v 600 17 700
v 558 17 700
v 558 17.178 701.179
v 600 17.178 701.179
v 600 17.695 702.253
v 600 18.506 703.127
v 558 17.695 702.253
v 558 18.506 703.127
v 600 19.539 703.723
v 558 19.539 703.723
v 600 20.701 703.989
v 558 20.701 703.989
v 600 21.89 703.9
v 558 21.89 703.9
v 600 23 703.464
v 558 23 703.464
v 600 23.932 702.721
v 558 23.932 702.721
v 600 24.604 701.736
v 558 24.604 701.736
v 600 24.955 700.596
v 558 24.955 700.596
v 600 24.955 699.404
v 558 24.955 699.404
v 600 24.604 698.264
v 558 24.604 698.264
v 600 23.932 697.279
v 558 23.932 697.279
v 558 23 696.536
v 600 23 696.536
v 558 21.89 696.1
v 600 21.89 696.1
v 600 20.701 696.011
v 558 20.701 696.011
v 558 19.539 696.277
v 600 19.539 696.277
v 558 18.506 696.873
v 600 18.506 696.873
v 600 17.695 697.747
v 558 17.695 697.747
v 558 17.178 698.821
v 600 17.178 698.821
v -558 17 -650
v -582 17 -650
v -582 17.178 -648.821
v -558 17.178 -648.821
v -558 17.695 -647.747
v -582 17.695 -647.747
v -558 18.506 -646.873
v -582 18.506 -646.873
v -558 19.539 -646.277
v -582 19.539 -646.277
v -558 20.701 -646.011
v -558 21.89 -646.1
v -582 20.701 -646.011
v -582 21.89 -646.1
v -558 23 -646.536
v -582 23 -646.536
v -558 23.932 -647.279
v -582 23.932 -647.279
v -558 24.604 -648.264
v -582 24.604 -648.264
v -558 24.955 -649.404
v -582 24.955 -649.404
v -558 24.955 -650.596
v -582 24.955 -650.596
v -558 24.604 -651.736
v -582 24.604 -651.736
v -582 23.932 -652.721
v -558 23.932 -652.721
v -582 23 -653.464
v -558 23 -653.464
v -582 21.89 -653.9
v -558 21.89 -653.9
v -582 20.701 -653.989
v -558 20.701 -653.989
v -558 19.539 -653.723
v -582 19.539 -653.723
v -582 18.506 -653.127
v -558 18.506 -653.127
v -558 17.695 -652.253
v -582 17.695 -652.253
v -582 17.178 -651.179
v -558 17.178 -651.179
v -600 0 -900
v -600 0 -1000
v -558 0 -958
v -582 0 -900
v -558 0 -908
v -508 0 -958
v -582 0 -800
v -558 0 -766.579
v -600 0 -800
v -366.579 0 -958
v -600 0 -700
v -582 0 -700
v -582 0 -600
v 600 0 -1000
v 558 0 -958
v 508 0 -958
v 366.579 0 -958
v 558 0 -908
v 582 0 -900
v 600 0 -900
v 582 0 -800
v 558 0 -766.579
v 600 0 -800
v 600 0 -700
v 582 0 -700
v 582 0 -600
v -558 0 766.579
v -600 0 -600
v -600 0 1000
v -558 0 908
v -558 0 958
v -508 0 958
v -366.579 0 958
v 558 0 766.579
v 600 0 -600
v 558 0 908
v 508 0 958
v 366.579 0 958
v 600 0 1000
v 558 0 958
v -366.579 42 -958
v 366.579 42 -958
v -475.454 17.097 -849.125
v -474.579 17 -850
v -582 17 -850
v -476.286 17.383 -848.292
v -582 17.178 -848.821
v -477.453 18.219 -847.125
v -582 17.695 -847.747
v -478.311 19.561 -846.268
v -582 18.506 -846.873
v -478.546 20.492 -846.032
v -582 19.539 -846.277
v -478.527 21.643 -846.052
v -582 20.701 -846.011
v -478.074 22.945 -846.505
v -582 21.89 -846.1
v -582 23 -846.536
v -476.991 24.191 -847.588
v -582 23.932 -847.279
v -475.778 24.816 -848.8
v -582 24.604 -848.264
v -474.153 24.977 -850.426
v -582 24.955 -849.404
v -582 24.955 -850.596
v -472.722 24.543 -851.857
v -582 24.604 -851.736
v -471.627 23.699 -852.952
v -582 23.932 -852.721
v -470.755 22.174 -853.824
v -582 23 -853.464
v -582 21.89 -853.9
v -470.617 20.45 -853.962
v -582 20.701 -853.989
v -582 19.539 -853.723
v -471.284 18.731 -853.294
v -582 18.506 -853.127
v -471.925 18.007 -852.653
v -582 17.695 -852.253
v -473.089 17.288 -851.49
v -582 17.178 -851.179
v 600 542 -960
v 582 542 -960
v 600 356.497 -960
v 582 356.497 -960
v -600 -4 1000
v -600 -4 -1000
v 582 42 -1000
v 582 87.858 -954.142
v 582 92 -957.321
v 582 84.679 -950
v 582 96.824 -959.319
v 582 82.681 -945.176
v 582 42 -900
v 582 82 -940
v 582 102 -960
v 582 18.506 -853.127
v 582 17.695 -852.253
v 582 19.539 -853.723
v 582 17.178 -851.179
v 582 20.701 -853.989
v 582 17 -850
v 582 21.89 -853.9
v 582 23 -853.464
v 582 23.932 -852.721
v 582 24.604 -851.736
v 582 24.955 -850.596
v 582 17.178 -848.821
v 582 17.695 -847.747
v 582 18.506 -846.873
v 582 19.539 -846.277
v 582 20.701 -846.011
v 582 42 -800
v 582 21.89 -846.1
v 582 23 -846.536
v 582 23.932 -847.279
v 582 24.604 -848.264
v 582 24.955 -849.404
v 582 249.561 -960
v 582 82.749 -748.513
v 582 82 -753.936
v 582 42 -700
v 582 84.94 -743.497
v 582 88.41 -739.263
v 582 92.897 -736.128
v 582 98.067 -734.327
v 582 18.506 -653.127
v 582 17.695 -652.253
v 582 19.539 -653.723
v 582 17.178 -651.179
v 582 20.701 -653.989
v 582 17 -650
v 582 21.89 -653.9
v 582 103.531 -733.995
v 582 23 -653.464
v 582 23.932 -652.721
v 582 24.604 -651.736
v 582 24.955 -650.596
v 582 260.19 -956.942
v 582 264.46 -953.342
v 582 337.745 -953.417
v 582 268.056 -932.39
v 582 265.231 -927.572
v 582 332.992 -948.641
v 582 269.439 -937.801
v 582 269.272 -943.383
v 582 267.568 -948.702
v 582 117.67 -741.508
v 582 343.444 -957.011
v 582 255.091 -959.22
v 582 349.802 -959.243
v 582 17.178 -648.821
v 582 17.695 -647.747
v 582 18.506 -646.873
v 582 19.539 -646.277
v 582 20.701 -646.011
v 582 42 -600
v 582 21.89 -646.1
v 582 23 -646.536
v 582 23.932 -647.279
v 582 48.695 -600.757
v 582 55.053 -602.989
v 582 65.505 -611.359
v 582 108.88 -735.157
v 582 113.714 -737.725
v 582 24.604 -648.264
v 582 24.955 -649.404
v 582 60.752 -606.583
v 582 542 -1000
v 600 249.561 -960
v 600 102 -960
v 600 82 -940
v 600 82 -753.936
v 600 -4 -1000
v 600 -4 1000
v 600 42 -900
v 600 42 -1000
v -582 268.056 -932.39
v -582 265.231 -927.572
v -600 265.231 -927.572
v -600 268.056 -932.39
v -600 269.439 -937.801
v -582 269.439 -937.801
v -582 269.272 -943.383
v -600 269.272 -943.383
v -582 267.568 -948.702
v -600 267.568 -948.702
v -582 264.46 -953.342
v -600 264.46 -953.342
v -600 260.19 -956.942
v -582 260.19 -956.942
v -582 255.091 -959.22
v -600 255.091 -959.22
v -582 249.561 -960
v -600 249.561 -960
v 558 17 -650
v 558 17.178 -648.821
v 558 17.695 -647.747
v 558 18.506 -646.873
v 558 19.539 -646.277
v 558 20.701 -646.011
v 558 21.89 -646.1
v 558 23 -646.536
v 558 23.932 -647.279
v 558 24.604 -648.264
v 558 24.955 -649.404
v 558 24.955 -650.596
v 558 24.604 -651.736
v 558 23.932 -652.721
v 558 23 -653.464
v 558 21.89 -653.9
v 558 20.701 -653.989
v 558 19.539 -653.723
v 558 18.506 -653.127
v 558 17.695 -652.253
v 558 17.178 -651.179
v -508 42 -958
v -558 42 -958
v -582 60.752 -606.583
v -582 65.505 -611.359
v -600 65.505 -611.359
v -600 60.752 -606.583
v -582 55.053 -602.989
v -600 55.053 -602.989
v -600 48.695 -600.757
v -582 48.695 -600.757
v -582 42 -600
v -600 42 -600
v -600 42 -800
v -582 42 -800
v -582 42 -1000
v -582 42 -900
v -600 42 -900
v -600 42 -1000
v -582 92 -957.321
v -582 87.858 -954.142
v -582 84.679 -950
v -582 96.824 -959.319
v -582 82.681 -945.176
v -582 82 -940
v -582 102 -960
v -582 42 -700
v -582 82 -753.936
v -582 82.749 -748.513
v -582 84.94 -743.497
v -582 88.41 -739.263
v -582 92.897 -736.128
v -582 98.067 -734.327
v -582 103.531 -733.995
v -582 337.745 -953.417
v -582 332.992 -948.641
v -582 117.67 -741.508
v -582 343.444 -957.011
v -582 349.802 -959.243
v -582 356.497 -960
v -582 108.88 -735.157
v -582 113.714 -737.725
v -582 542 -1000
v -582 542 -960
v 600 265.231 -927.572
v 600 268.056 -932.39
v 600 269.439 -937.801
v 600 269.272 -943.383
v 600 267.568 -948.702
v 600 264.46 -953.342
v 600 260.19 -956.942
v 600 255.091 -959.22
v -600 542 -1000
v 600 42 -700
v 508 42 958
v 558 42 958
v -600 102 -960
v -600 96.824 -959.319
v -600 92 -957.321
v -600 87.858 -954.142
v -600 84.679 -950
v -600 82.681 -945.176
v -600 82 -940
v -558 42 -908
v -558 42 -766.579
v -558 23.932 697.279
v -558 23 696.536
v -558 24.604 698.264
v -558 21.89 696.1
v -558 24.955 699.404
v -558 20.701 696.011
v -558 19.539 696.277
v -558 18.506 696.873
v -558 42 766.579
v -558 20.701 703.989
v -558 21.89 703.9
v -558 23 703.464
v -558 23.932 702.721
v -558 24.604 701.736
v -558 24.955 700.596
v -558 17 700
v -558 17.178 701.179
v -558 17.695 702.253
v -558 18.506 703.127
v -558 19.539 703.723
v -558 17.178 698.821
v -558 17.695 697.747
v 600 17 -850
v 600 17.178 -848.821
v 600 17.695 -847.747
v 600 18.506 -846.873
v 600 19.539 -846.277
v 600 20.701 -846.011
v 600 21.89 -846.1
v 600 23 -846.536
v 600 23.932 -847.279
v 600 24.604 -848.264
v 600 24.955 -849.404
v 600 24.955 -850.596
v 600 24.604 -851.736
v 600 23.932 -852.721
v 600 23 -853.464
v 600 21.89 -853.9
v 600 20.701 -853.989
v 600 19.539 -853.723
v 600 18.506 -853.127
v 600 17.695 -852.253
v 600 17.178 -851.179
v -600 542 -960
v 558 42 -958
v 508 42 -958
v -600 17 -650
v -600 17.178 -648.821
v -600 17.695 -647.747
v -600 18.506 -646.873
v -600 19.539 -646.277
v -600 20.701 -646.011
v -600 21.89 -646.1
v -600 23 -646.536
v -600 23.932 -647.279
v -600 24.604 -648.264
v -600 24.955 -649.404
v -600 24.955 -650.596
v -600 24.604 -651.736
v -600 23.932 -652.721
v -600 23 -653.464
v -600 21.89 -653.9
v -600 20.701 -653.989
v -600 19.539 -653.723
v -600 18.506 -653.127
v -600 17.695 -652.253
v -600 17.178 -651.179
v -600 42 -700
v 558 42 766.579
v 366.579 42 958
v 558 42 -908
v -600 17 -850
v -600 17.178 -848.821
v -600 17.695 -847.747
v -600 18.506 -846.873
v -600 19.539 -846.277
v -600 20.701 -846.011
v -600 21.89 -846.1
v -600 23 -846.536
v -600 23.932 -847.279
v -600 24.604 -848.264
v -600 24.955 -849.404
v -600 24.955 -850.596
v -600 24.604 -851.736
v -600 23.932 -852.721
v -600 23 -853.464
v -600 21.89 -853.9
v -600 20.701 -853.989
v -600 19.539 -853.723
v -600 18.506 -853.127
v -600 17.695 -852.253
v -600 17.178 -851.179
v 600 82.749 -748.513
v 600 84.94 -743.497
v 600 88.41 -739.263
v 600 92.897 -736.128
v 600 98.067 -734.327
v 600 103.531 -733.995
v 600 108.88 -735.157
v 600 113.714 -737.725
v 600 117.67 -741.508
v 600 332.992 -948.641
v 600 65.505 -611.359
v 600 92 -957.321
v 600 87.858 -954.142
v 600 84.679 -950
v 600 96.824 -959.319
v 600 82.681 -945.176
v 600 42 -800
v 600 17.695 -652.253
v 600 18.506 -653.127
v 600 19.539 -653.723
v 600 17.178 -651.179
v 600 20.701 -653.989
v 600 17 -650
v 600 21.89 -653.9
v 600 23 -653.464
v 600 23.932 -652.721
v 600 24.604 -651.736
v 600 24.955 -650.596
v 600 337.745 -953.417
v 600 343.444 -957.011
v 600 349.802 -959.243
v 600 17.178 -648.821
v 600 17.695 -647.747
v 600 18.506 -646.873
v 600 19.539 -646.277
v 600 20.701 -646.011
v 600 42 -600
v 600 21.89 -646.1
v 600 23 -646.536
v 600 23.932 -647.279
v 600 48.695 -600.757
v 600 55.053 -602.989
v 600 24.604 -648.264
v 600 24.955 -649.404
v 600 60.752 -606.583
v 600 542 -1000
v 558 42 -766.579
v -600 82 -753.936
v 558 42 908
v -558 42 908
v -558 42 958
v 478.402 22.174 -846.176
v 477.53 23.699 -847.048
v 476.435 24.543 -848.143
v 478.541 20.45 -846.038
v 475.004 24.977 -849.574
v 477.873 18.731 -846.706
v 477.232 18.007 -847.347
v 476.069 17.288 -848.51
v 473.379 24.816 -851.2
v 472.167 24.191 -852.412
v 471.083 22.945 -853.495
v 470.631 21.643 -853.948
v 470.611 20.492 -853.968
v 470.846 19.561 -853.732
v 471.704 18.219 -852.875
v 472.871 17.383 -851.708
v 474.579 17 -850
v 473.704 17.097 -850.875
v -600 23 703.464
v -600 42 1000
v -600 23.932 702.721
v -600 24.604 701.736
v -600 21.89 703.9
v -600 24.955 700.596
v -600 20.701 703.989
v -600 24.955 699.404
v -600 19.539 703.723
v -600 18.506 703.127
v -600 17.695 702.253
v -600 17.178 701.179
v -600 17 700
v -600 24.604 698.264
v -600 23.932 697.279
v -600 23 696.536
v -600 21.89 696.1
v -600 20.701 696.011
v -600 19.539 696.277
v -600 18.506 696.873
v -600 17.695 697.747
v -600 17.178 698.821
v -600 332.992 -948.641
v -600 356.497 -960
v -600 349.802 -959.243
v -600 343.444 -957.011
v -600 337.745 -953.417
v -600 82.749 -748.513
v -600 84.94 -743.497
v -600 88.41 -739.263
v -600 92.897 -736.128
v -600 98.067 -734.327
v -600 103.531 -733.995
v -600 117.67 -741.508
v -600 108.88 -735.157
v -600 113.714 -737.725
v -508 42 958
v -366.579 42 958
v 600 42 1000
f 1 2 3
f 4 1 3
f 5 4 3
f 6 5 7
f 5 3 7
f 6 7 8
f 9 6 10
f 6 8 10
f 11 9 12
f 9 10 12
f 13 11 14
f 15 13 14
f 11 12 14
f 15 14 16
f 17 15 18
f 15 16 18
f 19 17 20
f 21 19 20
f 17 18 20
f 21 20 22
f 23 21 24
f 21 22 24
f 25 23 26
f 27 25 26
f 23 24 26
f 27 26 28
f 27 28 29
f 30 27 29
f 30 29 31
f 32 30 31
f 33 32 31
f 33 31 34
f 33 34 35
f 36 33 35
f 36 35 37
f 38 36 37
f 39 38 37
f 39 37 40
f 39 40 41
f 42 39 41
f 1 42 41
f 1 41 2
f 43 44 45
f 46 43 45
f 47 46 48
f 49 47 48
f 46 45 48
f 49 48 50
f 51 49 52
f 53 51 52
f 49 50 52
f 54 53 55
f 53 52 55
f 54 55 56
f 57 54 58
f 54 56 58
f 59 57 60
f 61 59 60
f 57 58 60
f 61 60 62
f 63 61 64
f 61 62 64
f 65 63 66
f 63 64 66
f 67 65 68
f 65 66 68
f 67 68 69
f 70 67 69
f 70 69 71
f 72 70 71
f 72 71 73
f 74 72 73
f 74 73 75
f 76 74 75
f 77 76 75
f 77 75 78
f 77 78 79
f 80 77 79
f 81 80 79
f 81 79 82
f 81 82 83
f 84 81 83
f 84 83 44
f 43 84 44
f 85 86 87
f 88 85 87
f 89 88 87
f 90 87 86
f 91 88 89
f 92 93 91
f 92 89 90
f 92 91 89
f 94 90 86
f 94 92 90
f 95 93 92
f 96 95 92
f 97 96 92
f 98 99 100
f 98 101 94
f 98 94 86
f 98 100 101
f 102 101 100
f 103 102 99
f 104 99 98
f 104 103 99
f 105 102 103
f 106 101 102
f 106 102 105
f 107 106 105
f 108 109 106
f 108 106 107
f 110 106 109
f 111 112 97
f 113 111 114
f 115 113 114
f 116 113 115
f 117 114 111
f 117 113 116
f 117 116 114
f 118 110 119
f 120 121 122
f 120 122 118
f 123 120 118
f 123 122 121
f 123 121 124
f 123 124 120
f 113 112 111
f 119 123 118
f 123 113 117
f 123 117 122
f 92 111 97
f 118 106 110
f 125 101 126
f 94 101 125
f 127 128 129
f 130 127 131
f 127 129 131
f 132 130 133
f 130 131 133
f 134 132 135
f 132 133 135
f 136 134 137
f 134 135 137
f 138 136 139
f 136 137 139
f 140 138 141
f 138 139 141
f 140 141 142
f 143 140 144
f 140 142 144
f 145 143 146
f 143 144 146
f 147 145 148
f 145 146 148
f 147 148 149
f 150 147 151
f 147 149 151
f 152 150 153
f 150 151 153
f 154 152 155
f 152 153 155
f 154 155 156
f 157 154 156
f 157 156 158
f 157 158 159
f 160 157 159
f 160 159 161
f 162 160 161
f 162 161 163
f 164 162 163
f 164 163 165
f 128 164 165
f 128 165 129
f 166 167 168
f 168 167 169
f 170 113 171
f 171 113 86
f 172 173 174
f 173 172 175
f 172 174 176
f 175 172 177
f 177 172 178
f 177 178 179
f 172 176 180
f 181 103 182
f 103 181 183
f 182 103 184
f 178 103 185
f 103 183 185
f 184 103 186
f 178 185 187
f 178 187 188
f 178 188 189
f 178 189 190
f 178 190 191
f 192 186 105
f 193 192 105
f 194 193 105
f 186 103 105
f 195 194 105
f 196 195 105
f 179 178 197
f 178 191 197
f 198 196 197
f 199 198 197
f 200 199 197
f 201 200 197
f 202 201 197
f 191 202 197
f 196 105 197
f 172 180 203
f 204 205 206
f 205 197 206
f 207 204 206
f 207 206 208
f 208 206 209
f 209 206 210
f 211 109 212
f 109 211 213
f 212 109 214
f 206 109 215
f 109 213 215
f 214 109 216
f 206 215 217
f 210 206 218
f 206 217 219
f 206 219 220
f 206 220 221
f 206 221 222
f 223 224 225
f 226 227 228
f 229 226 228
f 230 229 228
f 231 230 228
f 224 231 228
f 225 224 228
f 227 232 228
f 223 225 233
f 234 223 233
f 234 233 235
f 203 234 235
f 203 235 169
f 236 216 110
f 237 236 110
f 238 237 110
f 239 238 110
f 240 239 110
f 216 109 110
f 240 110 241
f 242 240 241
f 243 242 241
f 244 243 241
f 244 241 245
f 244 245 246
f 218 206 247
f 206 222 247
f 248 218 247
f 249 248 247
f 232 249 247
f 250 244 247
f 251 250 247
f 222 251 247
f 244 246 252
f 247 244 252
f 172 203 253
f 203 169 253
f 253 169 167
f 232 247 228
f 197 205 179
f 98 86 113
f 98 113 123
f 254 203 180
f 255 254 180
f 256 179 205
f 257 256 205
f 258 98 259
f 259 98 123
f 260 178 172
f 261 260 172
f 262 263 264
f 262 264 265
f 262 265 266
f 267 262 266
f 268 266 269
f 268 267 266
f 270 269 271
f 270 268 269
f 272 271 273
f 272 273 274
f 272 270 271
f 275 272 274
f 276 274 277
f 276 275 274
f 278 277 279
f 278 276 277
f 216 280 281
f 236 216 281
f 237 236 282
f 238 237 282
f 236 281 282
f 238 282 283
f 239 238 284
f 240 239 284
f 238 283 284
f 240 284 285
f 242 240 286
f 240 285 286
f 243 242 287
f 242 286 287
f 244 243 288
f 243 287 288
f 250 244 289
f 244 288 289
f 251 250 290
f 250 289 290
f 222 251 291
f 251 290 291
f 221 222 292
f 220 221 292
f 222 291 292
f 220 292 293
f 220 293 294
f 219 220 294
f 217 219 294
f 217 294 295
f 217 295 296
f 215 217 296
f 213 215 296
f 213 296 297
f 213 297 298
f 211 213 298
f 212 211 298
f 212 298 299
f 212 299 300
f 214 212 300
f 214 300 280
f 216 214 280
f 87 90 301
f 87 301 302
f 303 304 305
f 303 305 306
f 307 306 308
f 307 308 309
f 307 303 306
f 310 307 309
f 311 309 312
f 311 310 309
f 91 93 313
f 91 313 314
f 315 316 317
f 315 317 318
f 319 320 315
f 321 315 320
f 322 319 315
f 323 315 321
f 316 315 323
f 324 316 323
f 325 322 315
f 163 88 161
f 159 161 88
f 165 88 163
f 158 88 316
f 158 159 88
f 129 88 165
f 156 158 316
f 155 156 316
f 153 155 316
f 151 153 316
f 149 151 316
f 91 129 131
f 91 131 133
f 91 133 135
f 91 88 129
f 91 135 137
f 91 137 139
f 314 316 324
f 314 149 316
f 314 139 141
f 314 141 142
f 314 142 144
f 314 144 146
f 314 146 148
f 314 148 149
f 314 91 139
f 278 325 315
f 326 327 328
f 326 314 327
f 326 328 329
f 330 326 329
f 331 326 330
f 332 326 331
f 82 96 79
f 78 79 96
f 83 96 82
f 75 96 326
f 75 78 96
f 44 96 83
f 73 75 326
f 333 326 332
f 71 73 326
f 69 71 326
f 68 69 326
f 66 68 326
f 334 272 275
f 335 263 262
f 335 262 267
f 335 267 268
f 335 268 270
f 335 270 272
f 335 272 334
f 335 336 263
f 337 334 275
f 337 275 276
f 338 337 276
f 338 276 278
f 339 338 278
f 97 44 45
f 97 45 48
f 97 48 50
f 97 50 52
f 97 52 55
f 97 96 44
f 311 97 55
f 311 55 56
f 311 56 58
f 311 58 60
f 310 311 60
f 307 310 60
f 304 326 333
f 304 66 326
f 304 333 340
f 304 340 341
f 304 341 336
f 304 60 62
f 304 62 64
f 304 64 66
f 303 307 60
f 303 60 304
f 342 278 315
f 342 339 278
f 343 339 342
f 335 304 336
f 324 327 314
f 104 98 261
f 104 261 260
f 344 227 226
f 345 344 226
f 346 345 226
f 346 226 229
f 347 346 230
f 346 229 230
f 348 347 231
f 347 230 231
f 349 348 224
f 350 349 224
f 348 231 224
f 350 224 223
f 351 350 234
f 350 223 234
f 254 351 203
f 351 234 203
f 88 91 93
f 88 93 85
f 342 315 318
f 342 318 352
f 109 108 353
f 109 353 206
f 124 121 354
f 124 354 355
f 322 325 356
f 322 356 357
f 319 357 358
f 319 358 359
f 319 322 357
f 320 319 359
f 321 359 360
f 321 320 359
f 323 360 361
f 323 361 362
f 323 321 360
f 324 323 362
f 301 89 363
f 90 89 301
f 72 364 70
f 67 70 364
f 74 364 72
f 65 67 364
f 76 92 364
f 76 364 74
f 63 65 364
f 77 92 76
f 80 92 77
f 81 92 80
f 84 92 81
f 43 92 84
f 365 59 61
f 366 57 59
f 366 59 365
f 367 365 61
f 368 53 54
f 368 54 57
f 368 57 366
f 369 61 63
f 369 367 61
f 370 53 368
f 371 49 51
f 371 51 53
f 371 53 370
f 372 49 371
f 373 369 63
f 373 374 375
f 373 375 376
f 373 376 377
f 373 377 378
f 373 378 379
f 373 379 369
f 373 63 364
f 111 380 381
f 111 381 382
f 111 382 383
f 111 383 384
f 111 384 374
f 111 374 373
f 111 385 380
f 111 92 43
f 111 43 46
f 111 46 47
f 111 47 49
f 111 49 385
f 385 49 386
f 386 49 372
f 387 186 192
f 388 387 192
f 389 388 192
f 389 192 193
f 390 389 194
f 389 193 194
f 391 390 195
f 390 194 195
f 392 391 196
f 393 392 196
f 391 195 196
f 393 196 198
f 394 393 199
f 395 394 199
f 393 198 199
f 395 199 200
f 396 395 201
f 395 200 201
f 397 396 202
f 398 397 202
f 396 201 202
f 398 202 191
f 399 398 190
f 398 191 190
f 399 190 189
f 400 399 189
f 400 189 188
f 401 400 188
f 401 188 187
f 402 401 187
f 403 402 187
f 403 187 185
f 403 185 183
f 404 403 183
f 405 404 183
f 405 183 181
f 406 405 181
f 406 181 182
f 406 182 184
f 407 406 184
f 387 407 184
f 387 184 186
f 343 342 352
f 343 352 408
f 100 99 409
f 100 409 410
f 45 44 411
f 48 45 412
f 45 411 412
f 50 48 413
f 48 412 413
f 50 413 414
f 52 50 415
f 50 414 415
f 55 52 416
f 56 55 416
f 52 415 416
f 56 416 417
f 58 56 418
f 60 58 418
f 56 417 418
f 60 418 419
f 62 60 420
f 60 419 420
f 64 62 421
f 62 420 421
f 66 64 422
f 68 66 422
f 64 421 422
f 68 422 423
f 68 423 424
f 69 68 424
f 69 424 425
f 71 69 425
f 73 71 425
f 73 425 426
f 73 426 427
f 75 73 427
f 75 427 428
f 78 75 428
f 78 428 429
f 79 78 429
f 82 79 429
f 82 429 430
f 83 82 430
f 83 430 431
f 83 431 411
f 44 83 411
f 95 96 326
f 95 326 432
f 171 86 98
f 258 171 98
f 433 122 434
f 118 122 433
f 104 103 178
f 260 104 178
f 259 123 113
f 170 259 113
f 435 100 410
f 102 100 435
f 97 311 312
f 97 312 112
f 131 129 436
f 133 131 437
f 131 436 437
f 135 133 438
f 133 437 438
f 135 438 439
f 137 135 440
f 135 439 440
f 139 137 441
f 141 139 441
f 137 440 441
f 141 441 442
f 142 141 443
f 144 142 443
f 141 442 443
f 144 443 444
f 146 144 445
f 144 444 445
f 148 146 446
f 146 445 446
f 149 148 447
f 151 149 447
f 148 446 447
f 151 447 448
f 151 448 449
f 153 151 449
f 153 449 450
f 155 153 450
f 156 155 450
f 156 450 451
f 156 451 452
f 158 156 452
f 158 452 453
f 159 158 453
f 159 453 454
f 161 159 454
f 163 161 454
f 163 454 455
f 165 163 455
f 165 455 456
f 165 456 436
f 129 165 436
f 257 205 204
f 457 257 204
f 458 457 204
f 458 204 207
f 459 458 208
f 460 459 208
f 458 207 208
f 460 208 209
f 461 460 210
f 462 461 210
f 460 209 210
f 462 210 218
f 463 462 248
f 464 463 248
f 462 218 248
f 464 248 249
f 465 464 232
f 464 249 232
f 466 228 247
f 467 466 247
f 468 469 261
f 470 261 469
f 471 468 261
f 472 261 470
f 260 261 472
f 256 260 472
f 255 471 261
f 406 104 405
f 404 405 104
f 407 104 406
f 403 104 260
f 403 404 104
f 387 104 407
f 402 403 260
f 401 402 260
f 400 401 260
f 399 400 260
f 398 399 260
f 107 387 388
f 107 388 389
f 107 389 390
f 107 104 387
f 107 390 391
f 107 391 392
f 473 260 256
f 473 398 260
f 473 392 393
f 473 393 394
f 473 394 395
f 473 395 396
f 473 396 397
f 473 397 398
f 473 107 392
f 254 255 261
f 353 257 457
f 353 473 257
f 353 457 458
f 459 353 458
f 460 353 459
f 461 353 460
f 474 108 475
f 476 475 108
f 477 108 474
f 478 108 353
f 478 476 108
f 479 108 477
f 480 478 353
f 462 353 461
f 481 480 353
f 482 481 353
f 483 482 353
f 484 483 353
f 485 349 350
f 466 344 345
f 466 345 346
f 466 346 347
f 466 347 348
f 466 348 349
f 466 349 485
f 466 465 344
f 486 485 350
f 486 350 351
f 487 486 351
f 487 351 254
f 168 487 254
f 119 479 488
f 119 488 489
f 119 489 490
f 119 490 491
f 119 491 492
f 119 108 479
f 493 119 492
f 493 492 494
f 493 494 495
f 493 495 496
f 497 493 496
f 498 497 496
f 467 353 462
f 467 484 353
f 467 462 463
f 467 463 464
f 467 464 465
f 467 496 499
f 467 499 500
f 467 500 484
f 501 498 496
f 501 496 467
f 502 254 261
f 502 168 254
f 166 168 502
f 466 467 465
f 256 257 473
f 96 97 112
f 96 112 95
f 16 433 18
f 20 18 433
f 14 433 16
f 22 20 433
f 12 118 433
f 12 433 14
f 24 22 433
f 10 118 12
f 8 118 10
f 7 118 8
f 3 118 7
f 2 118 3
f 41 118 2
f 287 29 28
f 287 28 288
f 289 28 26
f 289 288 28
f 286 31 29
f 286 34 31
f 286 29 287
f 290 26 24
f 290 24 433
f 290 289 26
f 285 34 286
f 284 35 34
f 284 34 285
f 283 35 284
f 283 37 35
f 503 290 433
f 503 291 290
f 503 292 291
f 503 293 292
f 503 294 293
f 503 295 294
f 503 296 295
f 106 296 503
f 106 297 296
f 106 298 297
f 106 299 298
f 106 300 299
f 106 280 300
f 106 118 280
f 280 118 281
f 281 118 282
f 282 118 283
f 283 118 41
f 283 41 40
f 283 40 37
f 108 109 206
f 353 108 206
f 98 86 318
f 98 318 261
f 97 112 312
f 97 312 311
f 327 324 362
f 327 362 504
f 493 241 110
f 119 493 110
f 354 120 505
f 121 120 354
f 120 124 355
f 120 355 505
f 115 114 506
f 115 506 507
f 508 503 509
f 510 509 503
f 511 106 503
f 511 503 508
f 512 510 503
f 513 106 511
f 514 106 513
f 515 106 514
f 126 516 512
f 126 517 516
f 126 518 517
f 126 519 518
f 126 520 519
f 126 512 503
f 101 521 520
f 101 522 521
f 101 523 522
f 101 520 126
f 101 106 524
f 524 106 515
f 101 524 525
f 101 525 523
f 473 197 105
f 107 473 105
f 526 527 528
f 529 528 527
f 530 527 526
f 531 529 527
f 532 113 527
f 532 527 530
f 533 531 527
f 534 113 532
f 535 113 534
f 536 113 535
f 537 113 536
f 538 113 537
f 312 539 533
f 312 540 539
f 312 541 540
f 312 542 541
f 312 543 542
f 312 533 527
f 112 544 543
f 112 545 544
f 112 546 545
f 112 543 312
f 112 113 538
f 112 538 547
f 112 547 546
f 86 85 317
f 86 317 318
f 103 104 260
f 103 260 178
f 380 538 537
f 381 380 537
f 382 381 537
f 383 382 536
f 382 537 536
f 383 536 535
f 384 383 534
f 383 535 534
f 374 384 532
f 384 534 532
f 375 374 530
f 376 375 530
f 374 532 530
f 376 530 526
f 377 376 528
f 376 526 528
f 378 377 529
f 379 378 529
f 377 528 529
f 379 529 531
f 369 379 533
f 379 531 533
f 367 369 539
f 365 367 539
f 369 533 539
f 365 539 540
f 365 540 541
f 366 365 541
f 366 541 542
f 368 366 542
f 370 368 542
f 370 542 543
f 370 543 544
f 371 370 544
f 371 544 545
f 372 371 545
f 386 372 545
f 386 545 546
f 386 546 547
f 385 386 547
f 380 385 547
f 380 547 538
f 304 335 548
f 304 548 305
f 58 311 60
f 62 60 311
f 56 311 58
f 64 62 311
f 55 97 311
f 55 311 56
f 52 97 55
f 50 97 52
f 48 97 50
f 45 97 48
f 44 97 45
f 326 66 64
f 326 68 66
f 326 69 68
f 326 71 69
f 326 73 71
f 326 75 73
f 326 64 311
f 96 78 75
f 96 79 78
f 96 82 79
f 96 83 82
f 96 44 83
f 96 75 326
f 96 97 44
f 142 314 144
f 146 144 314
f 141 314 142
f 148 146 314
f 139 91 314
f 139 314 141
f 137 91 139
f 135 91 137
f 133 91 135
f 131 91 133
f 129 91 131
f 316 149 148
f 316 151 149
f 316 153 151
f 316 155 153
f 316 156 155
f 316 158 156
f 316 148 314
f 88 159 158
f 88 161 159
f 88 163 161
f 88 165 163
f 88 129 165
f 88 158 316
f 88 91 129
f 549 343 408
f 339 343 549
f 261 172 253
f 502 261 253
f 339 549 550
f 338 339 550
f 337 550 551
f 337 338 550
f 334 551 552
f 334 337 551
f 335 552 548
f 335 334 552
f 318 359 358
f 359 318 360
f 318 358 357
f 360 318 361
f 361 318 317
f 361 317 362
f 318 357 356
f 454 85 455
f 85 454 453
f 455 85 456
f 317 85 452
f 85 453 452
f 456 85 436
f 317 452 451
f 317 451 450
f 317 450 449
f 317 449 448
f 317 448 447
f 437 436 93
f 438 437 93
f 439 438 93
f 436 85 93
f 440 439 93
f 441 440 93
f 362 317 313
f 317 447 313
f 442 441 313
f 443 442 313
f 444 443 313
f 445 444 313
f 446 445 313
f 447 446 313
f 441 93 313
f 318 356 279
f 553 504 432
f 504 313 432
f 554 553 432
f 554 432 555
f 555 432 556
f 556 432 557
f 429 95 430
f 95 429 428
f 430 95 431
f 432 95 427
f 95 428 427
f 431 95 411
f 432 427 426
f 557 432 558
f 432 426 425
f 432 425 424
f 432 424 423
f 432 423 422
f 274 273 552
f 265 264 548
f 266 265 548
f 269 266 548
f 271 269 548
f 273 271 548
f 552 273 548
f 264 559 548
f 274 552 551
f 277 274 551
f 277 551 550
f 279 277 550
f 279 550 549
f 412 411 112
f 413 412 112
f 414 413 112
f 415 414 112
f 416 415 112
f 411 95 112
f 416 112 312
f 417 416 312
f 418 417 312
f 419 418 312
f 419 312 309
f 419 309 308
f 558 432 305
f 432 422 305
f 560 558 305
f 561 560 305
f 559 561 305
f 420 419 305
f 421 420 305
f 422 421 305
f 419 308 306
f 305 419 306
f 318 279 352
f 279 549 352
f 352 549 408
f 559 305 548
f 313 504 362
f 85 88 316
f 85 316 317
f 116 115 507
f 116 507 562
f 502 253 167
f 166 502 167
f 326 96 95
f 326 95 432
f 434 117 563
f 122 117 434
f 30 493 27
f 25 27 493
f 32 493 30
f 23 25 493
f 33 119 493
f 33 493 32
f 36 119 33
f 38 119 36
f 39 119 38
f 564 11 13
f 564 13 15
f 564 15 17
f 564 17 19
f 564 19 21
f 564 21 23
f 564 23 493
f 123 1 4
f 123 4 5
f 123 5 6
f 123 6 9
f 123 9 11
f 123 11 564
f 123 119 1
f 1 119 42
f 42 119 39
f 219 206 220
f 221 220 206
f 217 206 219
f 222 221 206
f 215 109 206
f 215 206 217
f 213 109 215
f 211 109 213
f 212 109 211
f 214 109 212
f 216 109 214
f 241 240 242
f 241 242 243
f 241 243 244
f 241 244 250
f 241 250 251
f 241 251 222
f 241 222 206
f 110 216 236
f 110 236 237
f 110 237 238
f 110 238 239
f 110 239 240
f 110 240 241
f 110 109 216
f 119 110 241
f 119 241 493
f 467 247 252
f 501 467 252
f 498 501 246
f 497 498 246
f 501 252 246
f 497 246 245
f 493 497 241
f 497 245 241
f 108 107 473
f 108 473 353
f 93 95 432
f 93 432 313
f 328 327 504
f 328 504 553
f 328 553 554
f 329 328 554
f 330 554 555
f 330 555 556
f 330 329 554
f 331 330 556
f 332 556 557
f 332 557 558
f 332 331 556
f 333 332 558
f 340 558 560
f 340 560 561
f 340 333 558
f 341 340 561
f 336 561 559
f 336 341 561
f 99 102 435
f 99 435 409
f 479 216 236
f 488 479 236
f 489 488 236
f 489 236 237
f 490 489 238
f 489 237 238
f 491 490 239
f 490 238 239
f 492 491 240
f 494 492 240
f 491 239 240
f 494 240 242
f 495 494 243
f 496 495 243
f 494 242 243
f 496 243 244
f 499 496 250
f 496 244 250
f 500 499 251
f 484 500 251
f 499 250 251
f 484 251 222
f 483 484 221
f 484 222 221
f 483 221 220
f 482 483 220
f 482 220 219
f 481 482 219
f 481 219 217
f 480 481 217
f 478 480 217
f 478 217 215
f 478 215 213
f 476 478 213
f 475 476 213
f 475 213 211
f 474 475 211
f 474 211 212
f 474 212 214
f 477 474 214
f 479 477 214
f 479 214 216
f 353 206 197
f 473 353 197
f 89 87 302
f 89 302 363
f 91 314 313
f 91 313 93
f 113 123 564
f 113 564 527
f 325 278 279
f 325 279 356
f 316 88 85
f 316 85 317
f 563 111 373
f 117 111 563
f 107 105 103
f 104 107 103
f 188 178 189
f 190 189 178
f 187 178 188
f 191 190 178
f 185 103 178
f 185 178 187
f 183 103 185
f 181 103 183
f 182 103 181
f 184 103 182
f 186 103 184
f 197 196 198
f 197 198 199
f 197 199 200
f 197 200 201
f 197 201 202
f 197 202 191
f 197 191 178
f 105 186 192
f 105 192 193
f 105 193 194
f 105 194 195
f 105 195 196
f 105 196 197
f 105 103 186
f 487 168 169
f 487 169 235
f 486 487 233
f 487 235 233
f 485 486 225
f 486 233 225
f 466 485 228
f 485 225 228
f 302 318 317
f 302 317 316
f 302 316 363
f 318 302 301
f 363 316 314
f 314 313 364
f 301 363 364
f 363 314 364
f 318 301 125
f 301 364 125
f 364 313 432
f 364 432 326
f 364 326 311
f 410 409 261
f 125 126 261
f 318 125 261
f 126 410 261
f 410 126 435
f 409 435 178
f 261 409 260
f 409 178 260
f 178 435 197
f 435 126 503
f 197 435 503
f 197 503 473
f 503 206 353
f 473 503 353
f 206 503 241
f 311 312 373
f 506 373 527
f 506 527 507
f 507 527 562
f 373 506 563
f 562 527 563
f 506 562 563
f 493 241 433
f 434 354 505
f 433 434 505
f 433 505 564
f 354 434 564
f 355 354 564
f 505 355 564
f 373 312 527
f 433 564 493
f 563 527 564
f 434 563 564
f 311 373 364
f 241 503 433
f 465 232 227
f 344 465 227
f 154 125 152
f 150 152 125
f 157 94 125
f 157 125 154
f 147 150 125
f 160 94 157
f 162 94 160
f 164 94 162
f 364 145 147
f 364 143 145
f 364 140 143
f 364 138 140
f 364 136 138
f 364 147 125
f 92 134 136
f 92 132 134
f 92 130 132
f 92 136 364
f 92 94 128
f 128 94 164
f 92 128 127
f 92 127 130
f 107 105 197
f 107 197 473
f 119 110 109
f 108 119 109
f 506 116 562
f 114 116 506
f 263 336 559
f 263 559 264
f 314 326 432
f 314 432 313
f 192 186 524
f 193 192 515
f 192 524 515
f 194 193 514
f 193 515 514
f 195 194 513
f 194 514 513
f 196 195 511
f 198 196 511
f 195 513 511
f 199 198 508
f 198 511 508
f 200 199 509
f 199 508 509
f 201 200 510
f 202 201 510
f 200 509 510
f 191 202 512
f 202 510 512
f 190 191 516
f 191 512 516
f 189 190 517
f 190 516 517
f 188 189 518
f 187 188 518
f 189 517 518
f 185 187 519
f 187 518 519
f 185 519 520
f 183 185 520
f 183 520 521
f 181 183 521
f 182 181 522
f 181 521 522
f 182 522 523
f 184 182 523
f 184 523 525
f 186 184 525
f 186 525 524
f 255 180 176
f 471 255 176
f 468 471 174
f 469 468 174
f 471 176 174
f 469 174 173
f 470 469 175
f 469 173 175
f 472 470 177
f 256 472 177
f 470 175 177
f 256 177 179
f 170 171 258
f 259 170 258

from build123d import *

# Parameters (mm, degrees)
F3_W      = 18
F3_H      = 100
F4_DEPTH  = 4
F5_DEPTH  = 42
F8_DEPTH  = 18
F6_R      = 4
F10_DEPTH = 1200


with BuildPart() as f4:
    # F3 (on Front) → F4 (new body)
    with BuildSketch(Plane.XZ):
        Polygon((-600, -900), (-600, -1000), (-558, -1000), (-558, -958), (-558, -908), (-558, -766.5786437627), (-558, 766.5786437627), (-558, 908), (-558, 958), (-558, 1000), (-600, 1000), (-600, -600), (-582, -600), (-582, -700), (-600, -700), (-600, -800), (-582, -800), (-582, -900), align=None)
        Polygon((-558, -958), (-558, -1000), (558, -1000), (558, -958), (508, -958), (366.5786437627, -958), (-366.5786437627, -958), (-508, -958), align=None)
        with Locations((-591, -850)):
            Rectangle(F3_W, F3_H)
        Polygon((558, -958), (558, -1000), (600, -1000), (600, -900), (582, -900), (582, -800), (600, -800), (600, -700), (582, -700), (582, -600), (600, -600), (600, 1000), (558, 1000), (558, 958), (558, 908), (558, 766.5786437627), (558, -766.5786437627), (558, -908), align=None)
        with Locations((-591, -650)):
            Rectangle(F3_W, F3_H)
        with Locations((591, -850)):
            Rectangle(F3_W, F3_H)
        with Locations((591, -650)):
            Rectangle(F3_W, F3_H)
        Polygon((-508, 958), (-366.5786437627, 958), (366.5786437627, 958), (508, 958), (558, 958), (558, 1000), (-558, 1000), (-558, 958), align=None)
        Polygon((-558, 958), (-558, 908), (-508, 958), align=None)
        Polygon((-558, 908), (-558, 766.5786437627), (-366.5786437627, 958), (-508, 958), align=None)
        Polygon((-558, 766.5786437627), (-558, -766.5786437627), (-366.5786437627, -958), (366.5786437627, -958), (558, -766.5786437627), (558, 766.5786437627), (366.5786437627, 958), (-366.5786437627, 958), align=None)
        Polygon((366.5786437627, 958), (558, 766.5786437627), (558, 908), (508, 958), align=None)
        Polygon((508, 958), (558, 908), (558, 958), align=None)
        Polygon((508, -958), (558, -908), (558, -766.5786437627), (366.5786437627, -958), align=None)
        Polygon((508, -958), (558, -958), (558, -908), align=None)
        Polygon((-558, -766.5786437627), (-558, -908), (-508, -958), (-366.5786437627, -958), align=None)
        Polygon((-558, -908), (-558, -958), (-508, -958), align=None)
    extrude(amount=F4_DEPTH)


with BuildPart() as f5:
    # F3 (on Front) → F5 (new body)
    with BuildSketch(Plane.XZ):
        Polygon((-558, -958), (-558, -1000), (558, -1000), (558, -958), (508, -958), (366.5786437627, -958), (-366.5786437627, -958), (-508, -958), align=None)
        Polygon((-508, 958), (-366.5786437627, 958), (366.5786437627, 958), (508, 958), (558, 958), (558, 1000), (-558, 1000), (-558, 958), align=None)
        Polygon((-600, -900), (-600, -1000), (-558, -1000), (-558, -958), (-558, -908), (-558, -766.5786437627), (-558, 766.5786437627), (-558, 908), (-558, 958), (-558, 1000), (-600, 1000), (-600, -600), (-582, -600), (-582, -700), (-600, -700), (-600, -800), (-582, -800), (-582, -900), align=None)
        Polygon((558, -958), (558, -1000), (600, -1000), (600, -900), (582, -900), (582, -800), (600, -800), (600, -700), (582, -700), (582, -600), (600, -600), (600, 1000), (558, 1000), (558, 958), (558, 908), (558, 766.5786437627), (558, -766.5786437627), (558, -908), align=None)
        Polygon((-558, 908), (-558, 766.5786437627), (-366.5786437627, 958), (-508, 958), align=None)
        Polygon((366.5786437627, 958), (558, 766.5786437627), (558, 908), (508, 958), align=None)
        Polygon((508, -958), (558, -908), (558, -766.5786437627), (366.5786437627, -958), align=None)
        Polygon((-558, -766.5786437627), (-558, -908), (-508, -958), (-366.5786437627, -958), align=None)
    extrude(amount=-F5_DEPTH)


with BuildPart() as f8:
    # F7 (on face) → F8 (new body)
    with BuildSketch(Plane.YZ.offset(582)):
        with BuildLine():
            Line((42, -700), (42, -800))
            Line((42, -800), (0, -800))
            Line((0, -800), (0, -900))
            Line((0, -900), (42, -900))
            Line((42, -900), (42, -1000))
            Line((42, -1000), (542, -1000))
            Line((542, -1000), (542, -960))
            Line((542, -960), (356.4971909226, -960))
            ThreePointArc((356.4971909226, -960), (343.4441814195, -957.011459474), (332.9918017756, -948.6412628609))
            Line((332.9918017756, -948.6412628609), (65.505389147, -611.3587371391))
            ThreePointArc((65.505389147, -611.3587371391), (55.053009503, -602.988540526), (42, -600))
            Line((42, -600), (0, -600))
            Line((0, -600), (0, -700))
            Line((0, -700), (42, -700))
        make_face()
        with BuildLine():
            Line((249.560549471, -960), (102, -960))
            ThreePointArc((102, -960), (87.8578643763, -954.1421356237), (82, -940))
            Line((82, -940), (82, -753.9359889971))
            ThreePointArc((82, -753.9359889971), (95.4199235805, -735.0494171982), (117.6702594313, -741.5084804231))
            Line((117.6702594313, -741.5084804231), (265.2308089023, -927.5724914261))
            ThreePointArc((265.2308089023, -927.5724914261), (267.5681891203, -948.7020063354), (249.560549471, -960))
        make_face(mode=Mode.SUBTRACT)
    extrude(amount=F8_DEPTH)


with BuildPart() as f9_1:
    # F9: instance of F8
    add(f8.part.mirror(Plane.YZ))


with BuildPart() as f10_tool:
    # F6 (on face) → F10 (new body)
    with BuildSketch(Plane(origin=(-600, 0, 0), x_dir=(0, -1, 0), z_dir=(-1, 0, 0))):
        with Locations((-21, 700)):
            Circle(F6_R)
        with Locations((-21, -650)):
            Circle(F6_R)
        with Locations((-21, -850)):
            Circle(F6_R)
    extrude(amount=-F10_DEPTH)


with BuildPart() as f5_1:
    add(f5.part)

    # F10: cut by f10_tool
    add(f10_tool.part, mode=Mode.SUBTRACT)


with BuildPart() as f8_1:
    add(f8.part)

    # F10: cut by f10_tool
    add(f10_tool.part, mode=Mode.SUBTRACT)


with BuildPart() as f9_1_1:
    add(f9_1.part)

    # F10: cut by f10_tool
    add(f10_tool.part, mode=Mode.SUBTRACT)


solid = Compound([f4.part, f5_1.part, f8_1.part, f9_1_1.part])
